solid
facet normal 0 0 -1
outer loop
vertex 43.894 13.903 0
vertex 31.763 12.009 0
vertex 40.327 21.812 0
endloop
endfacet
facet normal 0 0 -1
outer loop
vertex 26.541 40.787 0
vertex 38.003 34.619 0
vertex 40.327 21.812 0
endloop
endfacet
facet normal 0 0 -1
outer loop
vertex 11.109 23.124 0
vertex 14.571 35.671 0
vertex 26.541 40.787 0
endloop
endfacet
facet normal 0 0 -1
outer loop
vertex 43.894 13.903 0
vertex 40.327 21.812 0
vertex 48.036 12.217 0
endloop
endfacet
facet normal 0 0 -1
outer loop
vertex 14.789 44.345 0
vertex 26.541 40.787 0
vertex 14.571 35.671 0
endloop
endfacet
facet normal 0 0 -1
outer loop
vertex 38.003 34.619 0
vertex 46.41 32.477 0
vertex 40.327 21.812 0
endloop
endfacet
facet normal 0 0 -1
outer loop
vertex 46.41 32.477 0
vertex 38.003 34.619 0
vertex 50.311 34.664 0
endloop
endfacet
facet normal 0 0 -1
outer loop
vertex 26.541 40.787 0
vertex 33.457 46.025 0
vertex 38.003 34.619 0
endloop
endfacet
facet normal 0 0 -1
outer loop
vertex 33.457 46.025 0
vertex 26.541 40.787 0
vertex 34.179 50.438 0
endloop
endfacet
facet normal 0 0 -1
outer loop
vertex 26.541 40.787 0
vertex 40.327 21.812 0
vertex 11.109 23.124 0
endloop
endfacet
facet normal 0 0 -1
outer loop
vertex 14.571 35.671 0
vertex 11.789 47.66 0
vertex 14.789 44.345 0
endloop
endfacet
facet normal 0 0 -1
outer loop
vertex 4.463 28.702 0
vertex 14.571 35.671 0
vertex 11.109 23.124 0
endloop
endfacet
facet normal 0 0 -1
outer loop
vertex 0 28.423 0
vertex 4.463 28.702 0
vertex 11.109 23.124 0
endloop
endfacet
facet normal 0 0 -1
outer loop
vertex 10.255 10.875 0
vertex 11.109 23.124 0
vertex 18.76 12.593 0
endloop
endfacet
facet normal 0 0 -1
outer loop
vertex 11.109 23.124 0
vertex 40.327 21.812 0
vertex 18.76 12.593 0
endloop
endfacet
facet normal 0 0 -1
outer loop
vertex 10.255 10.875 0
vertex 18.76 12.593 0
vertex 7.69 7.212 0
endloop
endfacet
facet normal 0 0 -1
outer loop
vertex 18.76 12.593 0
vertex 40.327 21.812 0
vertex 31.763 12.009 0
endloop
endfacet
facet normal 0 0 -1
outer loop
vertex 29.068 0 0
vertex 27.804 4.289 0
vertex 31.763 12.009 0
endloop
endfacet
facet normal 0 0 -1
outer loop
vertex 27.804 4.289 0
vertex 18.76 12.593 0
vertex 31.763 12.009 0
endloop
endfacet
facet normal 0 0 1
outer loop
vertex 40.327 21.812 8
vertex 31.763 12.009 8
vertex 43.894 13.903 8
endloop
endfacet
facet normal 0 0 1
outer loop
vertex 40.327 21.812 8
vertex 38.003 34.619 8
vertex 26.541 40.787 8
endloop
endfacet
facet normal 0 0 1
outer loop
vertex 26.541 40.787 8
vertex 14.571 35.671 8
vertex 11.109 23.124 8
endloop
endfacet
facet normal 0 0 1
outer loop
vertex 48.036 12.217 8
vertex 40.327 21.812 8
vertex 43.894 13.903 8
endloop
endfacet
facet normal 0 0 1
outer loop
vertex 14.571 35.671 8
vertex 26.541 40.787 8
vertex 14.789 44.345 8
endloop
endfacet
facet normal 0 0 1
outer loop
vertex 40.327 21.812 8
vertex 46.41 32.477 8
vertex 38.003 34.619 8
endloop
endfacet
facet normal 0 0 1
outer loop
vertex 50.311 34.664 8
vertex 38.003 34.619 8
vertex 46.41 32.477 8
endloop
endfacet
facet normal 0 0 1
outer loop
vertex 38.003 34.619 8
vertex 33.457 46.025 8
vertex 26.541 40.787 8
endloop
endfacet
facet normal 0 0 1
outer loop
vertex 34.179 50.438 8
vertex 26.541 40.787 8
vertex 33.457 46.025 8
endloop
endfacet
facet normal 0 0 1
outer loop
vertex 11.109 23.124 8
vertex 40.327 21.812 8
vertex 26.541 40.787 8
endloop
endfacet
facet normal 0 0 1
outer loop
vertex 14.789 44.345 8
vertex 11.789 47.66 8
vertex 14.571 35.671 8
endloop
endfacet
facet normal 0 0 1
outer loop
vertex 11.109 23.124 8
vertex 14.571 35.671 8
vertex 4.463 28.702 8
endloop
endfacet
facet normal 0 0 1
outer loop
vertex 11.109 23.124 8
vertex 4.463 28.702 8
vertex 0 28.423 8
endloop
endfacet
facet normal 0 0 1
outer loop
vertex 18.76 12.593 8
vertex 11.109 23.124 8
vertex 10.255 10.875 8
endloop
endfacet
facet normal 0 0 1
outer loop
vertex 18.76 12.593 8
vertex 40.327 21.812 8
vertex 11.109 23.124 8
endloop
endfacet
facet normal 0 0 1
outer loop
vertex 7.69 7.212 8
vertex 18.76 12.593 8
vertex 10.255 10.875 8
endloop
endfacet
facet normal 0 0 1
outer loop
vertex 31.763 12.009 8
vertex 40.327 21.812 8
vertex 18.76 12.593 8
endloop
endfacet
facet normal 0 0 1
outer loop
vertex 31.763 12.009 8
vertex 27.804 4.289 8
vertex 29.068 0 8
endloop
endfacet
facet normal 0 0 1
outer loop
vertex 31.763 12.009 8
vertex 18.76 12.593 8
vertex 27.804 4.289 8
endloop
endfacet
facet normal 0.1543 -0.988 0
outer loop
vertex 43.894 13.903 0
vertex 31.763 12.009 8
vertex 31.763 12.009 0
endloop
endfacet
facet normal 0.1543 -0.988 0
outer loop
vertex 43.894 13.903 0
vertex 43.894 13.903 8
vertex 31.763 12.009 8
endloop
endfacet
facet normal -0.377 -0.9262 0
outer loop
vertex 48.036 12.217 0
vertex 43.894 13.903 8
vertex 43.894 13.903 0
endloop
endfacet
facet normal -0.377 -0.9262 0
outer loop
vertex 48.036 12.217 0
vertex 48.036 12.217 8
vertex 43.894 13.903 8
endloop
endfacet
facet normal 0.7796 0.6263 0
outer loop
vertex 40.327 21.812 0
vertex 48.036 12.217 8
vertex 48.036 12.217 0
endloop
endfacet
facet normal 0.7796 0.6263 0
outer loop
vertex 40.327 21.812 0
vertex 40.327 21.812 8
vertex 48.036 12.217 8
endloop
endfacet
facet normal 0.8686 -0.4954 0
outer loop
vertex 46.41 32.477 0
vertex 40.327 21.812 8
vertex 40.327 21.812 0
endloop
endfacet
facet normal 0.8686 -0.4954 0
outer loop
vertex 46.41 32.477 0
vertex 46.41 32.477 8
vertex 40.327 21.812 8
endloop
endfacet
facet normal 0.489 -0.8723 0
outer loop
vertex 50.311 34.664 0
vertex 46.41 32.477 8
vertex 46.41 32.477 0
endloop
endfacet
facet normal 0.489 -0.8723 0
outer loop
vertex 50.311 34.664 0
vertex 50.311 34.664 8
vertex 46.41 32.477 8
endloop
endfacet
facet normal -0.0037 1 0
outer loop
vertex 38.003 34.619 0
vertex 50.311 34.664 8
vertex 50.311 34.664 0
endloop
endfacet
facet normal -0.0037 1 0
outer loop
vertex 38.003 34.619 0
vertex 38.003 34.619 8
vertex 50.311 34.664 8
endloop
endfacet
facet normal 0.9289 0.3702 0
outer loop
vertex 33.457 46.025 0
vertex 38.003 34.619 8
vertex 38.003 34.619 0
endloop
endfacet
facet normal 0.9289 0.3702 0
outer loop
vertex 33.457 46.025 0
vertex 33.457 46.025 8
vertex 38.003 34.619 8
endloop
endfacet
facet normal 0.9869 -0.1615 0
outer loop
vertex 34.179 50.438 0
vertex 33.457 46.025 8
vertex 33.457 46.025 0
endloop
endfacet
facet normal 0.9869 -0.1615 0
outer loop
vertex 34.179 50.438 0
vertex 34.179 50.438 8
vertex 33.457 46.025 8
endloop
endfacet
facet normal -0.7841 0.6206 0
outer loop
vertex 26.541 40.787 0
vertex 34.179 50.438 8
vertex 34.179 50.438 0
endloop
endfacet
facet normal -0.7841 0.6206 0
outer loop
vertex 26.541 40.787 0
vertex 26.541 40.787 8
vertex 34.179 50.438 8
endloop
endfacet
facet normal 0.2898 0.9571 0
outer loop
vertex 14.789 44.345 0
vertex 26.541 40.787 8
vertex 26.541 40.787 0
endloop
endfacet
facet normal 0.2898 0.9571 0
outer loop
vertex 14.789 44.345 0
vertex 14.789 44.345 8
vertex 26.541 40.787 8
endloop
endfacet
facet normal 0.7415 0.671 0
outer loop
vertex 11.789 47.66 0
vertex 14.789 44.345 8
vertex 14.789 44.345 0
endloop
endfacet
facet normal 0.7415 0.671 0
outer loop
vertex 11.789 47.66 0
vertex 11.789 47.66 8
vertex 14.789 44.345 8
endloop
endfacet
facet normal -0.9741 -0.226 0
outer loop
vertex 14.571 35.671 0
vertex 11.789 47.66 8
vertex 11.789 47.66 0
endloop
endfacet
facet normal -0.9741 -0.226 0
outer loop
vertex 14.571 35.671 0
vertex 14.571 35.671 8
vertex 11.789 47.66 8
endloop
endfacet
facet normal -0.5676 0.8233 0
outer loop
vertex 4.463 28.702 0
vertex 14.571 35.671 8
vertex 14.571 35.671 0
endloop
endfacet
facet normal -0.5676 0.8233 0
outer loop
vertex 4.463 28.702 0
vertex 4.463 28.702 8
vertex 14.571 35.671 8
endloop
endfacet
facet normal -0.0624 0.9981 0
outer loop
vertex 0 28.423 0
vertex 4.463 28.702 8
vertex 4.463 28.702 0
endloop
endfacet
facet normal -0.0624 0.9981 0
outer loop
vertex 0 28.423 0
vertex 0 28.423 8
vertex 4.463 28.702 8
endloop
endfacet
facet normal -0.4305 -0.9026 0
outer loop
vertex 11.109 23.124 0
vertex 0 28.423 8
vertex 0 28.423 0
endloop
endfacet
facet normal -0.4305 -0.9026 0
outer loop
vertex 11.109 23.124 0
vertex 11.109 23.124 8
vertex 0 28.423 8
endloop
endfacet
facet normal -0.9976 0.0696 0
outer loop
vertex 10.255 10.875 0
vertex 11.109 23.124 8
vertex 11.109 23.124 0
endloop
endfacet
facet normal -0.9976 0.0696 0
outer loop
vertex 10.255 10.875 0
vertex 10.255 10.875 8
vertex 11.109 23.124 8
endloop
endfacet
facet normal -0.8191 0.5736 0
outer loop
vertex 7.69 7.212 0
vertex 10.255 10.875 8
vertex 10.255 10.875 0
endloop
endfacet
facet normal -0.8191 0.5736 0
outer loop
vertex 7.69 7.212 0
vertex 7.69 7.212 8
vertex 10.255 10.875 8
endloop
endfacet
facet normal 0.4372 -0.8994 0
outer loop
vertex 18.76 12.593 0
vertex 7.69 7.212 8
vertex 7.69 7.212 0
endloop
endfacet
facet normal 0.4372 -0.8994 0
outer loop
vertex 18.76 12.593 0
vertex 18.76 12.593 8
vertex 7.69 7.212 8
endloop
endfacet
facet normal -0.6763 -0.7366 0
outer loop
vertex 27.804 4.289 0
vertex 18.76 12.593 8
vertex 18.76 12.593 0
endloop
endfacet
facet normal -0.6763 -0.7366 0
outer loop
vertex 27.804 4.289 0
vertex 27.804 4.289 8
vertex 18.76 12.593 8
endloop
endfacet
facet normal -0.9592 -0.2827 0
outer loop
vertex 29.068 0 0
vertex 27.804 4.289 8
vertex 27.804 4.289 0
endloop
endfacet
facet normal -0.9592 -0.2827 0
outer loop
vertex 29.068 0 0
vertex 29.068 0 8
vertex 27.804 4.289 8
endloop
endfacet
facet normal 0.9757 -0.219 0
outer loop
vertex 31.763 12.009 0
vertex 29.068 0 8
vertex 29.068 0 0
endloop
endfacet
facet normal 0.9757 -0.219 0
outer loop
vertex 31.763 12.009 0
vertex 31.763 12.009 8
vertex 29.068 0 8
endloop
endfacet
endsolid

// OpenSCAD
$fn = 32;

// ----------------------------------------------------------------------
// Fan rotor section: 7 blades, 15 mm hub radius, 11 mm blades
// ----------------------------------------------------------------------

// --- parameters (mm) ---
profile_height = 8;       // extrusion height
profile_points = 21;      // points of the closed outline

profile = [[40.327, 21.812], [46.41, 32.477], [50.311, 34.664], [38.003, 34.619], [33.457, 46.025], [34.179, 50.438], [26.541, 40.787], [14.789, 44.345], [11.789, 47.66], [14.571, 35.671], [4.463, 28.702], [0, 28.423], [11.109, 23.124], [10.255, 10.875], [7.69, 7.212], [18.76, 12.593], [27.804, 4.289], [29.068, 0], [31.763, 12.009], [43.894, 13.903], [48.036, 12.217]];  // single closed polygon, 21 points, counter clockwise

// --- the one profile operation ---
linear_extrude(height = profile_height) polygon(points = profile);
